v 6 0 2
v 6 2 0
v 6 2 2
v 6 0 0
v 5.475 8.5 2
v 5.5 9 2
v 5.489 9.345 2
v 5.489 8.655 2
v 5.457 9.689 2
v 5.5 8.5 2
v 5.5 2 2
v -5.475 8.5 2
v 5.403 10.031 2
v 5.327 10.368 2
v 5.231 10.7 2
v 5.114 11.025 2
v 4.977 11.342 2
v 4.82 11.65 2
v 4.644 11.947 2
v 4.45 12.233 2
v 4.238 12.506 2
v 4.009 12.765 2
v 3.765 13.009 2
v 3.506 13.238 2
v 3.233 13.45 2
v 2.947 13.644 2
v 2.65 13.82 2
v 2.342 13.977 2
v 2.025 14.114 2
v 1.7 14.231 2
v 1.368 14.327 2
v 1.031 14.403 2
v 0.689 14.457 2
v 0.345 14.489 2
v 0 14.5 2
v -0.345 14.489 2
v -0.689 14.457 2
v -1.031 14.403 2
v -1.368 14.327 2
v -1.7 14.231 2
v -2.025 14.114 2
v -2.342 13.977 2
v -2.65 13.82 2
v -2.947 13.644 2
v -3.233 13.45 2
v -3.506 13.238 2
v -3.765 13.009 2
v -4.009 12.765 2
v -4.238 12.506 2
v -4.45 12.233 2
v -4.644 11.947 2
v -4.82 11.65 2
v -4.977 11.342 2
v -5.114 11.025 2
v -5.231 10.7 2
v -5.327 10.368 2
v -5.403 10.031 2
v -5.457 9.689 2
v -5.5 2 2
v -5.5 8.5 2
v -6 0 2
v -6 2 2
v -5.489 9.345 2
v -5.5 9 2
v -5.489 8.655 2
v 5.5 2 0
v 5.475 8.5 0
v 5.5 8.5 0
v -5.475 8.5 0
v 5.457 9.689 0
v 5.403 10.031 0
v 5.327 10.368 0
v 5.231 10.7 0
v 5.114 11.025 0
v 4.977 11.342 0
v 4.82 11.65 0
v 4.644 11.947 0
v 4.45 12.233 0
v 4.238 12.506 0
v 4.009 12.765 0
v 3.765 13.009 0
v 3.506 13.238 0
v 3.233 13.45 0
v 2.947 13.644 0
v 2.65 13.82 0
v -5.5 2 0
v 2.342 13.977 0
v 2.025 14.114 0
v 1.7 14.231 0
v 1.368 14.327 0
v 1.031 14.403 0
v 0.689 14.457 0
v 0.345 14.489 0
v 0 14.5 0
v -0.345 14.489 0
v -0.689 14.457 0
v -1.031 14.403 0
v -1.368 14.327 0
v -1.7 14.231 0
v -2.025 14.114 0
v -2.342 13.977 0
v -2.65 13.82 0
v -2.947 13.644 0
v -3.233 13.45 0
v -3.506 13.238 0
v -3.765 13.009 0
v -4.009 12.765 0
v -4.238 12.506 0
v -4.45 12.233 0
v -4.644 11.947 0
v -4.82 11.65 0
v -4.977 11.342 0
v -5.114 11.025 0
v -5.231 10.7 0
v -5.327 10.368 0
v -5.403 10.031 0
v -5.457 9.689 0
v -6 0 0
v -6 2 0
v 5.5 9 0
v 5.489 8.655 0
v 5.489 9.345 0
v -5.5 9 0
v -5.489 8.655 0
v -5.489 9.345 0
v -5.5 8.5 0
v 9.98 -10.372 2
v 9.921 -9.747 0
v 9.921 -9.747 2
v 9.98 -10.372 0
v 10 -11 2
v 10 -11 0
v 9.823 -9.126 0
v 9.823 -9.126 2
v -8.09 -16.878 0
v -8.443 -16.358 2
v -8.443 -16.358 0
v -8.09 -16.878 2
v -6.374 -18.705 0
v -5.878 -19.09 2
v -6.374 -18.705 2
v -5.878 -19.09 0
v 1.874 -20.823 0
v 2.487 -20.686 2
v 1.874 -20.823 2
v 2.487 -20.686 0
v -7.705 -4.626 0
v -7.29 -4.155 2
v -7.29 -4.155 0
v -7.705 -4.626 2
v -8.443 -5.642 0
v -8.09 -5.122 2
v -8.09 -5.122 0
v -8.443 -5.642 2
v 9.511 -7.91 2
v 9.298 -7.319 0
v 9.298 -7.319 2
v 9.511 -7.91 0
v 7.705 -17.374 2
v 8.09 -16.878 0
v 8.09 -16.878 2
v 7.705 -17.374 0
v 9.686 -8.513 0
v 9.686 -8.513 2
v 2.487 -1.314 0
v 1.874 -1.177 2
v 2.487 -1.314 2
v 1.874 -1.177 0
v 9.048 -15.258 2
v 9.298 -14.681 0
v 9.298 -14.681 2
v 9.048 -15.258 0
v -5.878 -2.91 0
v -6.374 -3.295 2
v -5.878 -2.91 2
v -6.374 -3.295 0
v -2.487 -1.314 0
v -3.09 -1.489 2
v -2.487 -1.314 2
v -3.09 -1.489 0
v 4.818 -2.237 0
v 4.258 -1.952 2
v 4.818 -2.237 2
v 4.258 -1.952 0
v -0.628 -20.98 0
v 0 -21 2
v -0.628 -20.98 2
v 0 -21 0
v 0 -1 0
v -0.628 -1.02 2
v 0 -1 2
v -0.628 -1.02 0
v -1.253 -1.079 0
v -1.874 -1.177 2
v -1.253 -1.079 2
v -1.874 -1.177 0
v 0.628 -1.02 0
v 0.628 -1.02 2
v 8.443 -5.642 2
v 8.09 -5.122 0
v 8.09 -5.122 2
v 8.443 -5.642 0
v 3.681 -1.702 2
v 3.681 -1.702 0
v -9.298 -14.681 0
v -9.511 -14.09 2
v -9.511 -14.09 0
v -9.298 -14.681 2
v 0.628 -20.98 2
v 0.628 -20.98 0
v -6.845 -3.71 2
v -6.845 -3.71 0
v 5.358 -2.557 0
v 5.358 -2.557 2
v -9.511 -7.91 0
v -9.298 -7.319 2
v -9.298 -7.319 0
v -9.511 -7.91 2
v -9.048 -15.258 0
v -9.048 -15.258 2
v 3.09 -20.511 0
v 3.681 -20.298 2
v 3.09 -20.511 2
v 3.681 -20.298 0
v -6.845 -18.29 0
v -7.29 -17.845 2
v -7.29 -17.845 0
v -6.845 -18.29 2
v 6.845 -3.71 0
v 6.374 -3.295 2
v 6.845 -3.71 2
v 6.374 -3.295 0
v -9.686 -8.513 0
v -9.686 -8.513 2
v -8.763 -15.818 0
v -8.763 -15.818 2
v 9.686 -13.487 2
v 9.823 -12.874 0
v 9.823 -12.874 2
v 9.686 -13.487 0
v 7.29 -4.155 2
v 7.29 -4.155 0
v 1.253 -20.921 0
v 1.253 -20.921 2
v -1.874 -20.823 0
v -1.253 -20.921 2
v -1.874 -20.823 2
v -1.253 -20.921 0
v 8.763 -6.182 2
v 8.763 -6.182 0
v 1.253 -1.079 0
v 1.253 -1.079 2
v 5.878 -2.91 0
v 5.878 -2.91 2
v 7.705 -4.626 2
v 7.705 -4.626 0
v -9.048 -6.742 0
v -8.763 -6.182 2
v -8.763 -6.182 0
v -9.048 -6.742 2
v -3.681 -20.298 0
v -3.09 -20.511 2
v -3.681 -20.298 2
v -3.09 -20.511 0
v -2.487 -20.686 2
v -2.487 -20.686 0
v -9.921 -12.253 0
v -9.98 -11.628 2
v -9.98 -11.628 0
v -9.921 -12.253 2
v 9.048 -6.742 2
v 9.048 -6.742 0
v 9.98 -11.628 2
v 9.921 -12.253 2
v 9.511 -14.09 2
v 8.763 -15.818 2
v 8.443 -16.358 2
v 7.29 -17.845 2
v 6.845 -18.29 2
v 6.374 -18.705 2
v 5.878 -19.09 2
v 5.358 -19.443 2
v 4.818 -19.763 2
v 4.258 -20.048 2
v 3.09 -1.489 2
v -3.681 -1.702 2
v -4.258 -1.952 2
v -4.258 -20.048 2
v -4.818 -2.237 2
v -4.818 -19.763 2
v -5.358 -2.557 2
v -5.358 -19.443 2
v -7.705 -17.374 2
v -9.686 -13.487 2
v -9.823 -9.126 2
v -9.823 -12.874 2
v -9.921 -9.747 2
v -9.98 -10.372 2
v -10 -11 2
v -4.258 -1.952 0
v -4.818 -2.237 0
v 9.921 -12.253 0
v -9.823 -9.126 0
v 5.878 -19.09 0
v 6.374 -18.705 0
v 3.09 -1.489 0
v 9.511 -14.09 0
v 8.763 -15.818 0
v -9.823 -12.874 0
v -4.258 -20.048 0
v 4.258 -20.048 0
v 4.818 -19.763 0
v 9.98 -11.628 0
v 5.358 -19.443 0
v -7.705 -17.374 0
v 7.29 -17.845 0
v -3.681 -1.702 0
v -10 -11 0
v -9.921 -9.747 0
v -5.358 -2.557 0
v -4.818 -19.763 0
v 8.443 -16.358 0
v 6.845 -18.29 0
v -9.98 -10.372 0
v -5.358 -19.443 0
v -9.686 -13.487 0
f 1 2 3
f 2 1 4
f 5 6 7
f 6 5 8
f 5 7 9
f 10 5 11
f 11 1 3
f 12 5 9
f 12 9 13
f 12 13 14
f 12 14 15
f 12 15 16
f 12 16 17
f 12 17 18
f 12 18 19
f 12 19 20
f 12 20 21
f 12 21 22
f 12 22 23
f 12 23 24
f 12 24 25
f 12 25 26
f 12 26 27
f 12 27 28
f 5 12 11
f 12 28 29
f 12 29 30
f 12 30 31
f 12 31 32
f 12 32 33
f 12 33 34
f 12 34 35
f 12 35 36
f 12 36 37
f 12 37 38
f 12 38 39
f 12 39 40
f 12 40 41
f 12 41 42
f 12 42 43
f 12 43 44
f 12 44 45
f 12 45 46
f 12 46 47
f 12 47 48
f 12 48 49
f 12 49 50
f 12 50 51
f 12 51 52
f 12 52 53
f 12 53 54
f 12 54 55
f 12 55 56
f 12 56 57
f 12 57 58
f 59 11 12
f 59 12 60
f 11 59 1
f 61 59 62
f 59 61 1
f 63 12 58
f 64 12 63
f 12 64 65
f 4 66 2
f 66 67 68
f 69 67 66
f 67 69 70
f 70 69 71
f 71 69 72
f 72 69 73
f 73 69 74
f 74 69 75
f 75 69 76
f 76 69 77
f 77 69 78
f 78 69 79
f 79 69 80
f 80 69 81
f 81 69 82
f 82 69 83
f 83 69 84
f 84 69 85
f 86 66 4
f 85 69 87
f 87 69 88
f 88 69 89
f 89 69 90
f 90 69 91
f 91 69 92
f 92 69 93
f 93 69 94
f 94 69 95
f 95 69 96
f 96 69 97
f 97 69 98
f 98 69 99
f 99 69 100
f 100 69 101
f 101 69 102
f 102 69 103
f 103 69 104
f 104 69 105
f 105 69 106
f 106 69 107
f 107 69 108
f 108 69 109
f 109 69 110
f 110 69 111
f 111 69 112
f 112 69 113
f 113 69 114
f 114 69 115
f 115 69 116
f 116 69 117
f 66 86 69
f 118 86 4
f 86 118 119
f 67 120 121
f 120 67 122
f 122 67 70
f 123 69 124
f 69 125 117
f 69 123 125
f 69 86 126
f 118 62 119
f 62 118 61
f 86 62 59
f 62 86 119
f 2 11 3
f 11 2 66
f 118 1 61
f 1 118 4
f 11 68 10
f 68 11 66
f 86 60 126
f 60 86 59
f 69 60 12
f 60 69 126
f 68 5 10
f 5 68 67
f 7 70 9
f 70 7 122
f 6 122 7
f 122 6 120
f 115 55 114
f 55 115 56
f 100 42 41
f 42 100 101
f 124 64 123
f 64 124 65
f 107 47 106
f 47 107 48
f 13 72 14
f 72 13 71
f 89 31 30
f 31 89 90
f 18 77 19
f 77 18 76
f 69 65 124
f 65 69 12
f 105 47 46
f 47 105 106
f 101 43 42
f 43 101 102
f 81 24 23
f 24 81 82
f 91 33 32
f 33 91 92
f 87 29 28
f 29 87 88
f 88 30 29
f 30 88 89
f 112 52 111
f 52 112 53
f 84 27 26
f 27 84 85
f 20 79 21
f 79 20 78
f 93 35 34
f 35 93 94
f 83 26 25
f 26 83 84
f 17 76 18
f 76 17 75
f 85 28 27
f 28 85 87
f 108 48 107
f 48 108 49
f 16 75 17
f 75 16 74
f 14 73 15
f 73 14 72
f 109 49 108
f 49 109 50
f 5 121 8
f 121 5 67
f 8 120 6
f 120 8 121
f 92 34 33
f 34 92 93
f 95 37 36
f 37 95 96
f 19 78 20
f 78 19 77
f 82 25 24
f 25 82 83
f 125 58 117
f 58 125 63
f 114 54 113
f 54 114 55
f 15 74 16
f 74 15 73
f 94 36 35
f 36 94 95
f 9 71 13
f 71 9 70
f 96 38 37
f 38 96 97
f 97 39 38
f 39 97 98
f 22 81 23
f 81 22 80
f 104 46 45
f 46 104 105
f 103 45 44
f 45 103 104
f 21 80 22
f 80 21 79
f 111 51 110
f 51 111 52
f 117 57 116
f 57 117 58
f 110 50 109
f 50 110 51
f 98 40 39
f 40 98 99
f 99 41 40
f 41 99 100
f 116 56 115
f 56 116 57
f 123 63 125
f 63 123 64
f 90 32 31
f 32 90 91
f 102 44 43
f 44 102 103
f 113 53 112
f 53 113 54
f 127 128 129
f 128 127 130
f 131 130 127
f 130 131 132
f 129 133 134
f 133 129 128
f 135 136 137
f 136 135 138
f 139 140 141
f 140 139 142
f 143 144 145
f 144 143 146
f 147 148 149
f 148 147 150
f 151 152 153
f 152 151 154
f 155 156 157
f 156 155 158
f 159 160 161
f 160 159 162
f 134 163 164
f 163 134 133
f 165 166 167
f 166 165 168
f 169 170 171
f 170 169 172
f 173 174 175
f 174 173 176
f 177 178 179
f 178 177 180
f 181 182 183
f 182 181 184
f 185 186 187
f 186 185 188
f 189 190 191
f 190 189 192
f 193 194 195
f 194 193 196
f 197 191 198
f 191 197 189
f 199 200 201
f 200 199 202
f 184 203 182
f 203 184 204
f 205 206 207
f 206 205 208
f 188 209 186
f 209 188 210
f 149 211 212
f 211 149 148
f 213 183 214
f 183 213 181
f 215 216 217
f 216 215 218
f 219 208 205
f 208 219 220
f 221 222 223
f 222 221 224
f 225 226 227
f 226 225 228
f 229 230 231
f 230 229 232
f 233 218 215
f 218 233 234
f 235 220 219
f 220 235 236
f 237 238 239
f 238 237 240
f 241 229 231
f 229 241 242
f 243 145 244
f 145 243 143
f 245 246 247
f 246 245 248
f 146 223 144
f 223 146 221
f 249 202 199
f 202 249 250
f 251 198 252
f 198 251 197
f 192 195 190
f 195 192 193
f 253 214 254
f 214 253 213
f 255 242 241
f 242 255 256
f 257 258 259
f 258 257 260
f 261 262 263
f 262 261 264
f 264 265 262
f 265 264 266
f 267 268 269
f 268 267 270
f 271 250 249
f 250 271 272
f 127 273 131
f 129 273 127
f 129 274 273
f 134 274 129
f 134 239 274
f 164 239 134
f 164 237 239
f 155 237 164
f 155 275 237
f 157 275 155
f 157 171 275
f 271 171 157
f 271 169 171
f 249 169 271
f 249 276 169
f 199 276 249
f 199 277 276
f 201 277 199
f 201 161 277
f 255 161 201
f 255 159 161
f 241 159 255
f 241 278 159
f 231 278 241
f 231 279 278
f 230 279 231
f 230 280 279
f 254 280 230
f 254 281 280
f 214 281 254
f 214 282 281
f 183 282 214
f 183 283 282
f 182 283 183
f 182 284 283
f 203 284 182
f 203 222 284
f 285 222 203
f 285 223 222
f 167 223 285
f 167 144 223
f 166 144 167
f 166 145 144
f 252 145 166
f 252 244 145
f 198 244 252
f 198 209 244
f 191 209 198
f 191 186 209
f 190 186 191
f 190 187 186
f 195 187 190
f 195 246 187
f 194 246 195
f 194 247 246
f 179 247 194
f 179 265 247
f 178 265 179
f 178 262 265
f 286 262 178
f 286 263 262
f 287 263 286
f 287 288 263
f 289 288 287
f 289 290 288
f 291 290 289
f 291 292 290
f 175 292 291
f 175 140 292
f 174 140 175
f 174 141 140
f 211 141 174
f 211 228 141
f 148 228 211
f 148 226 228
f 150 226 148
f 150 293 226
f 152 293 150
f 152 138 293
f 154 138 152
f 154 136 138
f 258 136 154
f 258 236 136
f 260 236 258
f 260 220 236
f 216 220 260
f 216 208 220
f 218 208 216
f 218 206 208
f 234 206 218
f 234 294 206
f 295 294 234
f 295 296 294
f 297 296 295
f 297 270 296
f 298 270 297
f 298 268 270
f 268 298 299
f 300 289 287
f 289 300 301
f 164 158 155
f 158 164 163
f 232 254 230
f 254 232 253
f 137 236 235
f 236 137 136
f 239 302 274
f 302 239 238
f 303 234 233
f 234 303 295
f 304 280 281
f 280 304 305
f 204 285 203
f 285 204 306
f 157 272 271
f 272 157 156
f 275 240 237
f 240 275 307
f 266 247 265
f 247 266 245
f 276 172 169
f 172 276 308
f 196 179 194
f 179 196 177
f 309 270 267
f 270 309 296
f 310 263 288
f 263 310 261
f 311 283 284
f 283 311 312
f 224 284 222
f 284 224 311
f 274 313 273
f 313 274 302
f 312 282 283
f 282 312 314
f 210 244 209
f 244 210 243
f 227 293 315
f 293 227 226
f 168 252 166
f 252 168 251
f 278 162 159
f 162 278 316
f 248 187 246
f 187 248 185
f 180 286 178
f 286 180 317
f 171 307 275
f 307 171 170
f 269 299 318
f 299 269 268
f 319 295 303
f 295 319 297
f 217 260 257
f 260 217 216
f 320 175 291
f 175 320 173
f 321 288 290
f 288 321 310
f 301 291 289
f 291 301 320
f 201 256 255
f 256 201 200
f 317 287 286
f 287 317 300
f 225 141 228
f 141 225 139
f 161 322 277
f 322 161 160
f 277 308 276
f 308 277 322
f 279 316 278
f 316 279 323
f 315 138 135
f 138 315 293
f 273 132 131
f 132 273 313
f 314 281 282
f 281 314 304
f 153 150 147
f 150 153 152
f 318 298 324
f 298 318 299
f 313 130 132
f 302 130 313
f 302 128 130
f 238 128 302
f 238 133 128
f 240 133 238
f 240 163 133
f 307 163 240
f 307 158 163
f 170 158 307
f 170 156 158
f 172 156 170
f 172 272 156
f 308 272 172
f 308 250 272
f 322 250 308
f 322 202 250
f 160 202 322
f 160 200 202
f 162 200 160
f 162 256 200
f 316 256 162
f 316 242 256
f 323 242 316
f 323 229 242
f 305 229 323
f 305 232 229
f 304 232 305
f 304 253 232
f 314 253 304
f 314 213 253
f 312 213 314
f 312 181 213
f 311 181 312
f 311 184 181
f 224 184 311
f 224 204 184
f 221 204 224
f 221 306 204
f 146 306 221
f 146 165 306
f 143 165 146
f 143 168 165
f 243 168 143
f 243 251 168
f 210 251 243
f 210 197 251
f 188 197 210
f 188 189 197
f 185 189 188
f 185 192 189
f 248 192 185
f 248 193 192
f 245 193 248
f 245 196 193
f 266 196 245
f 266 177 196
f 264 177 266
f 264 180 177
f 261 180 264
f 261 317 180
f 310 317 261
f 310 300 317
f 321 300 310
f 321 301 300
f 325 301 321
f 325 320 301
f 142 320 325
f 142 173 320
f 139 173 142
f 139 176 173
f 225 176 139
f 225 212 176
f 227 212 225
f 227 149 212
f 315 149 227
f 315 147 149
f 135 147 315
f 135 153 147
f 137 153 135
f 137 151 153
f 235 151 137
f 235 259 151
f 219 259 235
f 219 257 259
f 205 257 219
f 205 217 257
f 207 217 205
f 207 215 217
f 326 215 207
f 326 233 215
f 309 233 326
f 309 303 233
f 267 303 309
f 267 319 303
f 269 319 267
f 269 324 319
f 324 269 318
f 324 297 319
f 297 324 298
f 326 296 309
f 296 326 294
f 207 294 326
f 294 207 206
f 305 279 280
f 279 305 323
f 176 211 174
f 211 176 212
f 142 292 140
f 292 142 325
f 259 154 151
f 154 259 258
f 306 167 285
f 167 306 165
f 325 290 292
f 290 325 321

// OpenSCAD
throwieCutout();

/**
 * this modeled after a 5mm LED
 */
module throwieCutout(height=2)
{
    ledWidth = 10;
    ledHeight = 13;
    
    union()
    {
        // LED bottom cutout
        ledBottomCutoutLengthX = ledWidth + 1 + 1; 
        xTranslate = -ledBottomCutoutLengthX / 2.0;
        yLength = 13;
        color("brown")
        translate([xTranslate, 0, 0])
        cube([ledBottomCutoutLengthX, 2, height]);

        // LED middle coutout        
        yTranslate = 1.5;
        xLength = ledWidth + 1;
        xTranslateHBeam = -xLength / 2.0; 
        color("green")
        translate([xTranslateHBeam, yTranslate, 0])
        cube([xLength, 7, height]);
        
        // LED curved top
        curvedTopTranslateY = (2 + 7);
        curvedTopRadius = (ledWidth / 2.0) + 0.5;
        color("red")
        translate([0, curvedTopTranslateY, 0])
        cylinder (h = height, r=curvedTopRadius, $fn=100);
        
        // battery
        batteryRadius = 10;
        translate([0, -11, 0])
        cylinder (h = height, r=batteryRadius, $fn=100);
    }        
}
